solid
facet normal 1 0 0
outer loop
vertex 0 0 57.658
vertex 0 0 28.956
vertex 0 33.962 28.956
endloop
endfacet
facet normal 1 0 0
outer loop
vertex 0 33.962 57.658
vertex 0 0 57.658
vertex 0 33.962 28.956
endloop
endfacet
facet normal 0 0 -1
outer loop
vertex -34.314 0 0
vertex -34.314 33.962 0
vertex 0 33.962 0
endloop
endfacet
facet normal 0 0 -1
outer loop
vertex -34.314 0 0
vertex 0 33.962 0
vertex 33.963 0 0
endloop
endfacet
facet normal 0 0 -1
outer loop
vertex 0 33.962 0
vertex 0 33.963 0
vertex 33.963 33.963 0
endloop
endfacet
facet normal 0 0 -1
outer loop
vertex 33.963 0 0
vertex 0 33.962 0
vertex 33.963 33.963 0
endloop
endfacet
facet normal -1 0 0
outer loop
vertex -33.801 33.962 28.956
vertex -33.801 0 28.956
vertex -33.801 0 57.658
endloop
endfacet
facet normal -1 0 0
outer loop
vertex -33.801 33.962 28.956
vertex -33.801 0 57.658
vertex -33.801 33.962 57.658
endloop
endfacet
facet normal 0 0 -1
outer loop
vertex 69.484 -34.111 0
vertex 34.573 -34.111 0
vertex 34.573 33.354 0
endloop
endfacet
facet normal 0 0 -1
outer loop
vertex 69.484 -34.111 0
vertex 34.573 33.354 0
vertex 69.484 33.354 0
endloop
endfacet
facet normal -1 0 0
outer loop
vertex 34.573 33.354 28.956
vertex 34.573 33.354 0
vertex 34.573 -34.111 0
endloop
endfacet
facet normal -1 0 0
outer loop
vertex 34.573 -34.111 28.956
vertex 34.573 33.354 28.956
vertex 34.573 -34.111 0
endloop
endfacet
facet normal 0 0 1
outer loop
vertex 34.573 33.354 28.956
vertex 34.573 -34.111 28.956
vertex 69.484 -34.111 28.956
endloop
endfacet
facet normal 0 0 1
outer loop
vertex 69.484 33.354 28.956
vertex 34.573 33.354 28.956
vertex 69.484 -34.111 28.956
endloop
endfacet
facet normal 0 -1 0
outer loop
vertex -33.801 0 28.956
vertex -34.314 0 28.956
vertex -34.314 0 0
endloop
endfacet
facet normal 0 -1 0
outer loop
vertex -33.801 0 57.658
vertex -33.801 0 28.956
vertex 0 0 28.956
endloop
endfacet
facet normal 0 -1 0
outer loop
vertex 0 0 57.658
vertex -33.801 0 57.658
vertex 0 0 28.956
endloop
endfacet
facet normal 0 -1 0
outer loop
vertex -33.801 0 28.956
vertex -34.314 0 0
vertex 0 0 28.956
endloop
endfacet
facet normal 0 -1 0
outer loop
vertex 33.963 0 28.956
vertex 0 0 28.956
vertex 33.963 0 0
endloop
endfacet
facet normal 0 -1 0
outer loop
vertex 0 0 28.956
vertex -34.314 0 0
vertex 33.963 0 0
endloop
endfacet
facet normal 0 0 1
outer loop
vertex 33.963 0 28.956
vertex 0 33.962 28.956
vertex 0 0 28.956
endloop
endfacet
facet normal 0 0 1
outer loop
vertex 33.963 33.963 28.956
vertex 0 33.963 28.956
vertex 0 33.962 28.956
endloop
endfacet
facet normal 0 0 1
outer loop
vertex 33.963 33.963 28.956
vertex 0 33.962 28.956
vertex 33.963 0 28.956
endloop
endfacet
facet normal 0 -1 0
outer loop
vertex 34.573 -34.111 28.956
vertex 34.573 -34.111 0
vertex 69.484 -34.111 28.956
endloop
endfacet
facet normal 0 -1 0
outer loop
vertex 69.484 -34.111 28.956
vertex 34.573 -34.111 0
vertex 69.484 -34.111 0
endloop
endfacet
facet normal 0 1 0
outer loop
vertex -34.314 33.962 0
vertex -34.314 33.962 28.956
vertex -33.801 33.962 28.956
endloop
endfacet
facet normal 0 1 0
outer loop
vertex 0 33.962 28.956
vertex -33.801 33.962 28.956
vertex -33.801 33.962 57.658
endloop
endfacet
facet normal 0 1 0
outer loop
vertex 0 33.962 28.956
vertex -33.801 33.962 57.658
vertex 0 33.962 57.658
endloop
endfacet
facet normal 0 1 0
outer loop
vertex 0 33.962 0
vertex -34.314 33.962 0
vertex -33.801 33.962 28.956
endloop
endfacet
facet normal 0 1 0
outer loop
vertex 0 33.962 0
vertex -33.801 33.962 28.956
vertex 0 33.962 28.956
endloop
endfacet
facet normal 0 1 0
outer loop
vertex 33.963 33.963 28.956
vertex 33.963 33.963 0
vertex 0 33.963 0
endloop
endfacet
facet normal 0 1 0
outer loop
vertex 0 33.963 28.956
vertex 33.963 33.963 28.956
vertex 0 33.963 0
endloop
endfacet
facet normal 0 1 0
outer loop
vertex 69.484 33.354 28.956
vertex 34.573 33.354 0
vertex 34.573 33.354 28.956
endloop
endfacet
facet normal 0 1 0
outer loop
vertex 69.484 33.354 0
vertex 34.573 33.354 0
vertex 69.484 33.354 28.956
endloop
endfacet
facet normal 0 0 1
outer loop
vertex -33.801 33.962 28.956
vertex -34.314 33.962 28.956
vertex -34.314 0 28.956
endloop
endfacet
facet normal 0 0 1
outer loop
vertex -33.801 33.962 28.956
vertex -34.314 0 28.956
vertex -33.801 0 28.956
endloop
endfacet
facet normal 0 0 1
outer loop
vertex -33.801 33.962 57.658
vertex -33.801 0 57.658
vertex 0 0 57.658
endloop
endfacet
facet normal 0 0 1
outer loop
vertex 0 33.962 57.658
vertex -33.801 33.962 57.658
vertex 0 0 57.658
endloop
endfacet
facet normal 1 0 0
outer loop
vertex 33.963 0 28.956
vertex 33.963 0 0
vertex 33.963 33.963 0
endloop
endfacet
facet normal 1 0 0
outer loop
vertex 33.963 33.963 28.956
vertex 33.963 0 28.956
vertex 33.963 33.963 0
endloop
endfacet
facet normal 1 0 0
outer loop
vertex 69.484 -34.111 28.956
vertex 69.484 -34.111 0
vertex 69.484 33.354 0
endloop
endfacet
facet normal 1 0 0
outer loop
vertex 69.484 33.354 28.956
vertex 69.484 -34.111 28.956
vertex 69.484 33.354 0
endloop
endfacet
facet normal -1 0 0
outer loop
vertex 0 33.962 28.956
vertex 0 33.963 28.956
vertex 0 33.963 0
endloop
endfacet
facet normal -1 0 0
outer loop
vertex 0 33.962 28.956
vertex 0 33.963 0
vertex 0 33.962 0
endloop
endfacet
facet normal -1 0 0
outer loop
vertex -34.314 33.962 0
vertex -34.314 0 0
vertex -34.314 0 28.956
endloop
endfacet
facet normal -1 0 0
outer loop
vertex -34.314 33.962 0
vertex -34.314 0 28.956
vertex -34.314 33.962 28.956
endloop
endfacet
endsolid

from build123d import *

# Parameters (mm, degrees)
F0_W      = 48.6852861941
F0_H      = 53.710911423
F0_W_2    = 54.6446330845
F0_W_3    = 52.1280243993
F0_H_2    = 53.485147655
F1_DEPTH  = 34.036
F2_W      = 53.8875311613
F2_H      = 53.710911423
F3_DEPTH  = 37.338
F6_W      = 34.9105373025
F6_H      = 33.3538427949
F6_H_2    = 34.1114252806
F7_DEPTH  = 28.956
F5_W      = 34.3135856092
F5_H      = 33.9616201818
F9_W      = 33.8014625013
F9_H      = 33.9616201818
F10_DEPTH = 28.702


with BuildPart() as f1:
    # F0 (on Top) → F1 (new body)
    with BuildSketch(Plane.XY):
        with Locations((-65.8202823251, 26.8554557115)):
            Rectangle(F0_W, F0_H)
        with Locations((-14.1553226858, 26.8554557115)):
            Rectangle(F0_W_2, F0_H)
        with Locations((39.2310060561, 26.8554557115)):
            Rectangle(F0_W_3, F0_H)
        with Locations((39.2310060561, -26.7425738275)):
            Rectangle(F0_W_3, F0_H_2)
    extrude(amount=F1_DEPTH)

    # F2 (on face) → F3 (join)
    with BuildSketch(Plane.XY.offset(34.036)):
        with Locations((-63.2191598415, 26.8554557115)):
            Rectangle(F2_W, F2_H)
    extrude(amount=F3_DEPTH)


with BuildPart() as f7:
    # F6 (on Top) → F7 (new body)
    with BuildSketch(Plane.XY):
        with Locations((52.0283095539, 16.6769213974)):
            Rectangle(F6_W, F6_H)
        with Locations((52.0283095539, -17.0557126403)):
            Rectangle(F6_W, F6_H_2)
    extrude(amount=F7_DEPTH)


with BuildPart() as f7b:
    # F5 (on Top) → F7, piece 2 (new body)
    with BuildSketch(Plane.XY):
        with Locations((-17.1567928046, 16.9808100909)):
            Rectangle(F5_W, F5_H)
        Polygon((0, 33.9616201818), (0, 0), (33.963445574, 0), (33.963445574, 33.963445574), (0, 33.963445574), align=None)
    extrude(amount=F7_DEPTH)

    # F9 (on face) → F10 (join)
    with BuildSketch(Plane.XY.offset(28.956)):
        with Locations((-16.9007312506, 16.9808100909)):
            Rectangle(F9_W, F9_H)
    extrude(amount=F10_DEPTH)


solid = Compound([f7.part, f7b.part])
